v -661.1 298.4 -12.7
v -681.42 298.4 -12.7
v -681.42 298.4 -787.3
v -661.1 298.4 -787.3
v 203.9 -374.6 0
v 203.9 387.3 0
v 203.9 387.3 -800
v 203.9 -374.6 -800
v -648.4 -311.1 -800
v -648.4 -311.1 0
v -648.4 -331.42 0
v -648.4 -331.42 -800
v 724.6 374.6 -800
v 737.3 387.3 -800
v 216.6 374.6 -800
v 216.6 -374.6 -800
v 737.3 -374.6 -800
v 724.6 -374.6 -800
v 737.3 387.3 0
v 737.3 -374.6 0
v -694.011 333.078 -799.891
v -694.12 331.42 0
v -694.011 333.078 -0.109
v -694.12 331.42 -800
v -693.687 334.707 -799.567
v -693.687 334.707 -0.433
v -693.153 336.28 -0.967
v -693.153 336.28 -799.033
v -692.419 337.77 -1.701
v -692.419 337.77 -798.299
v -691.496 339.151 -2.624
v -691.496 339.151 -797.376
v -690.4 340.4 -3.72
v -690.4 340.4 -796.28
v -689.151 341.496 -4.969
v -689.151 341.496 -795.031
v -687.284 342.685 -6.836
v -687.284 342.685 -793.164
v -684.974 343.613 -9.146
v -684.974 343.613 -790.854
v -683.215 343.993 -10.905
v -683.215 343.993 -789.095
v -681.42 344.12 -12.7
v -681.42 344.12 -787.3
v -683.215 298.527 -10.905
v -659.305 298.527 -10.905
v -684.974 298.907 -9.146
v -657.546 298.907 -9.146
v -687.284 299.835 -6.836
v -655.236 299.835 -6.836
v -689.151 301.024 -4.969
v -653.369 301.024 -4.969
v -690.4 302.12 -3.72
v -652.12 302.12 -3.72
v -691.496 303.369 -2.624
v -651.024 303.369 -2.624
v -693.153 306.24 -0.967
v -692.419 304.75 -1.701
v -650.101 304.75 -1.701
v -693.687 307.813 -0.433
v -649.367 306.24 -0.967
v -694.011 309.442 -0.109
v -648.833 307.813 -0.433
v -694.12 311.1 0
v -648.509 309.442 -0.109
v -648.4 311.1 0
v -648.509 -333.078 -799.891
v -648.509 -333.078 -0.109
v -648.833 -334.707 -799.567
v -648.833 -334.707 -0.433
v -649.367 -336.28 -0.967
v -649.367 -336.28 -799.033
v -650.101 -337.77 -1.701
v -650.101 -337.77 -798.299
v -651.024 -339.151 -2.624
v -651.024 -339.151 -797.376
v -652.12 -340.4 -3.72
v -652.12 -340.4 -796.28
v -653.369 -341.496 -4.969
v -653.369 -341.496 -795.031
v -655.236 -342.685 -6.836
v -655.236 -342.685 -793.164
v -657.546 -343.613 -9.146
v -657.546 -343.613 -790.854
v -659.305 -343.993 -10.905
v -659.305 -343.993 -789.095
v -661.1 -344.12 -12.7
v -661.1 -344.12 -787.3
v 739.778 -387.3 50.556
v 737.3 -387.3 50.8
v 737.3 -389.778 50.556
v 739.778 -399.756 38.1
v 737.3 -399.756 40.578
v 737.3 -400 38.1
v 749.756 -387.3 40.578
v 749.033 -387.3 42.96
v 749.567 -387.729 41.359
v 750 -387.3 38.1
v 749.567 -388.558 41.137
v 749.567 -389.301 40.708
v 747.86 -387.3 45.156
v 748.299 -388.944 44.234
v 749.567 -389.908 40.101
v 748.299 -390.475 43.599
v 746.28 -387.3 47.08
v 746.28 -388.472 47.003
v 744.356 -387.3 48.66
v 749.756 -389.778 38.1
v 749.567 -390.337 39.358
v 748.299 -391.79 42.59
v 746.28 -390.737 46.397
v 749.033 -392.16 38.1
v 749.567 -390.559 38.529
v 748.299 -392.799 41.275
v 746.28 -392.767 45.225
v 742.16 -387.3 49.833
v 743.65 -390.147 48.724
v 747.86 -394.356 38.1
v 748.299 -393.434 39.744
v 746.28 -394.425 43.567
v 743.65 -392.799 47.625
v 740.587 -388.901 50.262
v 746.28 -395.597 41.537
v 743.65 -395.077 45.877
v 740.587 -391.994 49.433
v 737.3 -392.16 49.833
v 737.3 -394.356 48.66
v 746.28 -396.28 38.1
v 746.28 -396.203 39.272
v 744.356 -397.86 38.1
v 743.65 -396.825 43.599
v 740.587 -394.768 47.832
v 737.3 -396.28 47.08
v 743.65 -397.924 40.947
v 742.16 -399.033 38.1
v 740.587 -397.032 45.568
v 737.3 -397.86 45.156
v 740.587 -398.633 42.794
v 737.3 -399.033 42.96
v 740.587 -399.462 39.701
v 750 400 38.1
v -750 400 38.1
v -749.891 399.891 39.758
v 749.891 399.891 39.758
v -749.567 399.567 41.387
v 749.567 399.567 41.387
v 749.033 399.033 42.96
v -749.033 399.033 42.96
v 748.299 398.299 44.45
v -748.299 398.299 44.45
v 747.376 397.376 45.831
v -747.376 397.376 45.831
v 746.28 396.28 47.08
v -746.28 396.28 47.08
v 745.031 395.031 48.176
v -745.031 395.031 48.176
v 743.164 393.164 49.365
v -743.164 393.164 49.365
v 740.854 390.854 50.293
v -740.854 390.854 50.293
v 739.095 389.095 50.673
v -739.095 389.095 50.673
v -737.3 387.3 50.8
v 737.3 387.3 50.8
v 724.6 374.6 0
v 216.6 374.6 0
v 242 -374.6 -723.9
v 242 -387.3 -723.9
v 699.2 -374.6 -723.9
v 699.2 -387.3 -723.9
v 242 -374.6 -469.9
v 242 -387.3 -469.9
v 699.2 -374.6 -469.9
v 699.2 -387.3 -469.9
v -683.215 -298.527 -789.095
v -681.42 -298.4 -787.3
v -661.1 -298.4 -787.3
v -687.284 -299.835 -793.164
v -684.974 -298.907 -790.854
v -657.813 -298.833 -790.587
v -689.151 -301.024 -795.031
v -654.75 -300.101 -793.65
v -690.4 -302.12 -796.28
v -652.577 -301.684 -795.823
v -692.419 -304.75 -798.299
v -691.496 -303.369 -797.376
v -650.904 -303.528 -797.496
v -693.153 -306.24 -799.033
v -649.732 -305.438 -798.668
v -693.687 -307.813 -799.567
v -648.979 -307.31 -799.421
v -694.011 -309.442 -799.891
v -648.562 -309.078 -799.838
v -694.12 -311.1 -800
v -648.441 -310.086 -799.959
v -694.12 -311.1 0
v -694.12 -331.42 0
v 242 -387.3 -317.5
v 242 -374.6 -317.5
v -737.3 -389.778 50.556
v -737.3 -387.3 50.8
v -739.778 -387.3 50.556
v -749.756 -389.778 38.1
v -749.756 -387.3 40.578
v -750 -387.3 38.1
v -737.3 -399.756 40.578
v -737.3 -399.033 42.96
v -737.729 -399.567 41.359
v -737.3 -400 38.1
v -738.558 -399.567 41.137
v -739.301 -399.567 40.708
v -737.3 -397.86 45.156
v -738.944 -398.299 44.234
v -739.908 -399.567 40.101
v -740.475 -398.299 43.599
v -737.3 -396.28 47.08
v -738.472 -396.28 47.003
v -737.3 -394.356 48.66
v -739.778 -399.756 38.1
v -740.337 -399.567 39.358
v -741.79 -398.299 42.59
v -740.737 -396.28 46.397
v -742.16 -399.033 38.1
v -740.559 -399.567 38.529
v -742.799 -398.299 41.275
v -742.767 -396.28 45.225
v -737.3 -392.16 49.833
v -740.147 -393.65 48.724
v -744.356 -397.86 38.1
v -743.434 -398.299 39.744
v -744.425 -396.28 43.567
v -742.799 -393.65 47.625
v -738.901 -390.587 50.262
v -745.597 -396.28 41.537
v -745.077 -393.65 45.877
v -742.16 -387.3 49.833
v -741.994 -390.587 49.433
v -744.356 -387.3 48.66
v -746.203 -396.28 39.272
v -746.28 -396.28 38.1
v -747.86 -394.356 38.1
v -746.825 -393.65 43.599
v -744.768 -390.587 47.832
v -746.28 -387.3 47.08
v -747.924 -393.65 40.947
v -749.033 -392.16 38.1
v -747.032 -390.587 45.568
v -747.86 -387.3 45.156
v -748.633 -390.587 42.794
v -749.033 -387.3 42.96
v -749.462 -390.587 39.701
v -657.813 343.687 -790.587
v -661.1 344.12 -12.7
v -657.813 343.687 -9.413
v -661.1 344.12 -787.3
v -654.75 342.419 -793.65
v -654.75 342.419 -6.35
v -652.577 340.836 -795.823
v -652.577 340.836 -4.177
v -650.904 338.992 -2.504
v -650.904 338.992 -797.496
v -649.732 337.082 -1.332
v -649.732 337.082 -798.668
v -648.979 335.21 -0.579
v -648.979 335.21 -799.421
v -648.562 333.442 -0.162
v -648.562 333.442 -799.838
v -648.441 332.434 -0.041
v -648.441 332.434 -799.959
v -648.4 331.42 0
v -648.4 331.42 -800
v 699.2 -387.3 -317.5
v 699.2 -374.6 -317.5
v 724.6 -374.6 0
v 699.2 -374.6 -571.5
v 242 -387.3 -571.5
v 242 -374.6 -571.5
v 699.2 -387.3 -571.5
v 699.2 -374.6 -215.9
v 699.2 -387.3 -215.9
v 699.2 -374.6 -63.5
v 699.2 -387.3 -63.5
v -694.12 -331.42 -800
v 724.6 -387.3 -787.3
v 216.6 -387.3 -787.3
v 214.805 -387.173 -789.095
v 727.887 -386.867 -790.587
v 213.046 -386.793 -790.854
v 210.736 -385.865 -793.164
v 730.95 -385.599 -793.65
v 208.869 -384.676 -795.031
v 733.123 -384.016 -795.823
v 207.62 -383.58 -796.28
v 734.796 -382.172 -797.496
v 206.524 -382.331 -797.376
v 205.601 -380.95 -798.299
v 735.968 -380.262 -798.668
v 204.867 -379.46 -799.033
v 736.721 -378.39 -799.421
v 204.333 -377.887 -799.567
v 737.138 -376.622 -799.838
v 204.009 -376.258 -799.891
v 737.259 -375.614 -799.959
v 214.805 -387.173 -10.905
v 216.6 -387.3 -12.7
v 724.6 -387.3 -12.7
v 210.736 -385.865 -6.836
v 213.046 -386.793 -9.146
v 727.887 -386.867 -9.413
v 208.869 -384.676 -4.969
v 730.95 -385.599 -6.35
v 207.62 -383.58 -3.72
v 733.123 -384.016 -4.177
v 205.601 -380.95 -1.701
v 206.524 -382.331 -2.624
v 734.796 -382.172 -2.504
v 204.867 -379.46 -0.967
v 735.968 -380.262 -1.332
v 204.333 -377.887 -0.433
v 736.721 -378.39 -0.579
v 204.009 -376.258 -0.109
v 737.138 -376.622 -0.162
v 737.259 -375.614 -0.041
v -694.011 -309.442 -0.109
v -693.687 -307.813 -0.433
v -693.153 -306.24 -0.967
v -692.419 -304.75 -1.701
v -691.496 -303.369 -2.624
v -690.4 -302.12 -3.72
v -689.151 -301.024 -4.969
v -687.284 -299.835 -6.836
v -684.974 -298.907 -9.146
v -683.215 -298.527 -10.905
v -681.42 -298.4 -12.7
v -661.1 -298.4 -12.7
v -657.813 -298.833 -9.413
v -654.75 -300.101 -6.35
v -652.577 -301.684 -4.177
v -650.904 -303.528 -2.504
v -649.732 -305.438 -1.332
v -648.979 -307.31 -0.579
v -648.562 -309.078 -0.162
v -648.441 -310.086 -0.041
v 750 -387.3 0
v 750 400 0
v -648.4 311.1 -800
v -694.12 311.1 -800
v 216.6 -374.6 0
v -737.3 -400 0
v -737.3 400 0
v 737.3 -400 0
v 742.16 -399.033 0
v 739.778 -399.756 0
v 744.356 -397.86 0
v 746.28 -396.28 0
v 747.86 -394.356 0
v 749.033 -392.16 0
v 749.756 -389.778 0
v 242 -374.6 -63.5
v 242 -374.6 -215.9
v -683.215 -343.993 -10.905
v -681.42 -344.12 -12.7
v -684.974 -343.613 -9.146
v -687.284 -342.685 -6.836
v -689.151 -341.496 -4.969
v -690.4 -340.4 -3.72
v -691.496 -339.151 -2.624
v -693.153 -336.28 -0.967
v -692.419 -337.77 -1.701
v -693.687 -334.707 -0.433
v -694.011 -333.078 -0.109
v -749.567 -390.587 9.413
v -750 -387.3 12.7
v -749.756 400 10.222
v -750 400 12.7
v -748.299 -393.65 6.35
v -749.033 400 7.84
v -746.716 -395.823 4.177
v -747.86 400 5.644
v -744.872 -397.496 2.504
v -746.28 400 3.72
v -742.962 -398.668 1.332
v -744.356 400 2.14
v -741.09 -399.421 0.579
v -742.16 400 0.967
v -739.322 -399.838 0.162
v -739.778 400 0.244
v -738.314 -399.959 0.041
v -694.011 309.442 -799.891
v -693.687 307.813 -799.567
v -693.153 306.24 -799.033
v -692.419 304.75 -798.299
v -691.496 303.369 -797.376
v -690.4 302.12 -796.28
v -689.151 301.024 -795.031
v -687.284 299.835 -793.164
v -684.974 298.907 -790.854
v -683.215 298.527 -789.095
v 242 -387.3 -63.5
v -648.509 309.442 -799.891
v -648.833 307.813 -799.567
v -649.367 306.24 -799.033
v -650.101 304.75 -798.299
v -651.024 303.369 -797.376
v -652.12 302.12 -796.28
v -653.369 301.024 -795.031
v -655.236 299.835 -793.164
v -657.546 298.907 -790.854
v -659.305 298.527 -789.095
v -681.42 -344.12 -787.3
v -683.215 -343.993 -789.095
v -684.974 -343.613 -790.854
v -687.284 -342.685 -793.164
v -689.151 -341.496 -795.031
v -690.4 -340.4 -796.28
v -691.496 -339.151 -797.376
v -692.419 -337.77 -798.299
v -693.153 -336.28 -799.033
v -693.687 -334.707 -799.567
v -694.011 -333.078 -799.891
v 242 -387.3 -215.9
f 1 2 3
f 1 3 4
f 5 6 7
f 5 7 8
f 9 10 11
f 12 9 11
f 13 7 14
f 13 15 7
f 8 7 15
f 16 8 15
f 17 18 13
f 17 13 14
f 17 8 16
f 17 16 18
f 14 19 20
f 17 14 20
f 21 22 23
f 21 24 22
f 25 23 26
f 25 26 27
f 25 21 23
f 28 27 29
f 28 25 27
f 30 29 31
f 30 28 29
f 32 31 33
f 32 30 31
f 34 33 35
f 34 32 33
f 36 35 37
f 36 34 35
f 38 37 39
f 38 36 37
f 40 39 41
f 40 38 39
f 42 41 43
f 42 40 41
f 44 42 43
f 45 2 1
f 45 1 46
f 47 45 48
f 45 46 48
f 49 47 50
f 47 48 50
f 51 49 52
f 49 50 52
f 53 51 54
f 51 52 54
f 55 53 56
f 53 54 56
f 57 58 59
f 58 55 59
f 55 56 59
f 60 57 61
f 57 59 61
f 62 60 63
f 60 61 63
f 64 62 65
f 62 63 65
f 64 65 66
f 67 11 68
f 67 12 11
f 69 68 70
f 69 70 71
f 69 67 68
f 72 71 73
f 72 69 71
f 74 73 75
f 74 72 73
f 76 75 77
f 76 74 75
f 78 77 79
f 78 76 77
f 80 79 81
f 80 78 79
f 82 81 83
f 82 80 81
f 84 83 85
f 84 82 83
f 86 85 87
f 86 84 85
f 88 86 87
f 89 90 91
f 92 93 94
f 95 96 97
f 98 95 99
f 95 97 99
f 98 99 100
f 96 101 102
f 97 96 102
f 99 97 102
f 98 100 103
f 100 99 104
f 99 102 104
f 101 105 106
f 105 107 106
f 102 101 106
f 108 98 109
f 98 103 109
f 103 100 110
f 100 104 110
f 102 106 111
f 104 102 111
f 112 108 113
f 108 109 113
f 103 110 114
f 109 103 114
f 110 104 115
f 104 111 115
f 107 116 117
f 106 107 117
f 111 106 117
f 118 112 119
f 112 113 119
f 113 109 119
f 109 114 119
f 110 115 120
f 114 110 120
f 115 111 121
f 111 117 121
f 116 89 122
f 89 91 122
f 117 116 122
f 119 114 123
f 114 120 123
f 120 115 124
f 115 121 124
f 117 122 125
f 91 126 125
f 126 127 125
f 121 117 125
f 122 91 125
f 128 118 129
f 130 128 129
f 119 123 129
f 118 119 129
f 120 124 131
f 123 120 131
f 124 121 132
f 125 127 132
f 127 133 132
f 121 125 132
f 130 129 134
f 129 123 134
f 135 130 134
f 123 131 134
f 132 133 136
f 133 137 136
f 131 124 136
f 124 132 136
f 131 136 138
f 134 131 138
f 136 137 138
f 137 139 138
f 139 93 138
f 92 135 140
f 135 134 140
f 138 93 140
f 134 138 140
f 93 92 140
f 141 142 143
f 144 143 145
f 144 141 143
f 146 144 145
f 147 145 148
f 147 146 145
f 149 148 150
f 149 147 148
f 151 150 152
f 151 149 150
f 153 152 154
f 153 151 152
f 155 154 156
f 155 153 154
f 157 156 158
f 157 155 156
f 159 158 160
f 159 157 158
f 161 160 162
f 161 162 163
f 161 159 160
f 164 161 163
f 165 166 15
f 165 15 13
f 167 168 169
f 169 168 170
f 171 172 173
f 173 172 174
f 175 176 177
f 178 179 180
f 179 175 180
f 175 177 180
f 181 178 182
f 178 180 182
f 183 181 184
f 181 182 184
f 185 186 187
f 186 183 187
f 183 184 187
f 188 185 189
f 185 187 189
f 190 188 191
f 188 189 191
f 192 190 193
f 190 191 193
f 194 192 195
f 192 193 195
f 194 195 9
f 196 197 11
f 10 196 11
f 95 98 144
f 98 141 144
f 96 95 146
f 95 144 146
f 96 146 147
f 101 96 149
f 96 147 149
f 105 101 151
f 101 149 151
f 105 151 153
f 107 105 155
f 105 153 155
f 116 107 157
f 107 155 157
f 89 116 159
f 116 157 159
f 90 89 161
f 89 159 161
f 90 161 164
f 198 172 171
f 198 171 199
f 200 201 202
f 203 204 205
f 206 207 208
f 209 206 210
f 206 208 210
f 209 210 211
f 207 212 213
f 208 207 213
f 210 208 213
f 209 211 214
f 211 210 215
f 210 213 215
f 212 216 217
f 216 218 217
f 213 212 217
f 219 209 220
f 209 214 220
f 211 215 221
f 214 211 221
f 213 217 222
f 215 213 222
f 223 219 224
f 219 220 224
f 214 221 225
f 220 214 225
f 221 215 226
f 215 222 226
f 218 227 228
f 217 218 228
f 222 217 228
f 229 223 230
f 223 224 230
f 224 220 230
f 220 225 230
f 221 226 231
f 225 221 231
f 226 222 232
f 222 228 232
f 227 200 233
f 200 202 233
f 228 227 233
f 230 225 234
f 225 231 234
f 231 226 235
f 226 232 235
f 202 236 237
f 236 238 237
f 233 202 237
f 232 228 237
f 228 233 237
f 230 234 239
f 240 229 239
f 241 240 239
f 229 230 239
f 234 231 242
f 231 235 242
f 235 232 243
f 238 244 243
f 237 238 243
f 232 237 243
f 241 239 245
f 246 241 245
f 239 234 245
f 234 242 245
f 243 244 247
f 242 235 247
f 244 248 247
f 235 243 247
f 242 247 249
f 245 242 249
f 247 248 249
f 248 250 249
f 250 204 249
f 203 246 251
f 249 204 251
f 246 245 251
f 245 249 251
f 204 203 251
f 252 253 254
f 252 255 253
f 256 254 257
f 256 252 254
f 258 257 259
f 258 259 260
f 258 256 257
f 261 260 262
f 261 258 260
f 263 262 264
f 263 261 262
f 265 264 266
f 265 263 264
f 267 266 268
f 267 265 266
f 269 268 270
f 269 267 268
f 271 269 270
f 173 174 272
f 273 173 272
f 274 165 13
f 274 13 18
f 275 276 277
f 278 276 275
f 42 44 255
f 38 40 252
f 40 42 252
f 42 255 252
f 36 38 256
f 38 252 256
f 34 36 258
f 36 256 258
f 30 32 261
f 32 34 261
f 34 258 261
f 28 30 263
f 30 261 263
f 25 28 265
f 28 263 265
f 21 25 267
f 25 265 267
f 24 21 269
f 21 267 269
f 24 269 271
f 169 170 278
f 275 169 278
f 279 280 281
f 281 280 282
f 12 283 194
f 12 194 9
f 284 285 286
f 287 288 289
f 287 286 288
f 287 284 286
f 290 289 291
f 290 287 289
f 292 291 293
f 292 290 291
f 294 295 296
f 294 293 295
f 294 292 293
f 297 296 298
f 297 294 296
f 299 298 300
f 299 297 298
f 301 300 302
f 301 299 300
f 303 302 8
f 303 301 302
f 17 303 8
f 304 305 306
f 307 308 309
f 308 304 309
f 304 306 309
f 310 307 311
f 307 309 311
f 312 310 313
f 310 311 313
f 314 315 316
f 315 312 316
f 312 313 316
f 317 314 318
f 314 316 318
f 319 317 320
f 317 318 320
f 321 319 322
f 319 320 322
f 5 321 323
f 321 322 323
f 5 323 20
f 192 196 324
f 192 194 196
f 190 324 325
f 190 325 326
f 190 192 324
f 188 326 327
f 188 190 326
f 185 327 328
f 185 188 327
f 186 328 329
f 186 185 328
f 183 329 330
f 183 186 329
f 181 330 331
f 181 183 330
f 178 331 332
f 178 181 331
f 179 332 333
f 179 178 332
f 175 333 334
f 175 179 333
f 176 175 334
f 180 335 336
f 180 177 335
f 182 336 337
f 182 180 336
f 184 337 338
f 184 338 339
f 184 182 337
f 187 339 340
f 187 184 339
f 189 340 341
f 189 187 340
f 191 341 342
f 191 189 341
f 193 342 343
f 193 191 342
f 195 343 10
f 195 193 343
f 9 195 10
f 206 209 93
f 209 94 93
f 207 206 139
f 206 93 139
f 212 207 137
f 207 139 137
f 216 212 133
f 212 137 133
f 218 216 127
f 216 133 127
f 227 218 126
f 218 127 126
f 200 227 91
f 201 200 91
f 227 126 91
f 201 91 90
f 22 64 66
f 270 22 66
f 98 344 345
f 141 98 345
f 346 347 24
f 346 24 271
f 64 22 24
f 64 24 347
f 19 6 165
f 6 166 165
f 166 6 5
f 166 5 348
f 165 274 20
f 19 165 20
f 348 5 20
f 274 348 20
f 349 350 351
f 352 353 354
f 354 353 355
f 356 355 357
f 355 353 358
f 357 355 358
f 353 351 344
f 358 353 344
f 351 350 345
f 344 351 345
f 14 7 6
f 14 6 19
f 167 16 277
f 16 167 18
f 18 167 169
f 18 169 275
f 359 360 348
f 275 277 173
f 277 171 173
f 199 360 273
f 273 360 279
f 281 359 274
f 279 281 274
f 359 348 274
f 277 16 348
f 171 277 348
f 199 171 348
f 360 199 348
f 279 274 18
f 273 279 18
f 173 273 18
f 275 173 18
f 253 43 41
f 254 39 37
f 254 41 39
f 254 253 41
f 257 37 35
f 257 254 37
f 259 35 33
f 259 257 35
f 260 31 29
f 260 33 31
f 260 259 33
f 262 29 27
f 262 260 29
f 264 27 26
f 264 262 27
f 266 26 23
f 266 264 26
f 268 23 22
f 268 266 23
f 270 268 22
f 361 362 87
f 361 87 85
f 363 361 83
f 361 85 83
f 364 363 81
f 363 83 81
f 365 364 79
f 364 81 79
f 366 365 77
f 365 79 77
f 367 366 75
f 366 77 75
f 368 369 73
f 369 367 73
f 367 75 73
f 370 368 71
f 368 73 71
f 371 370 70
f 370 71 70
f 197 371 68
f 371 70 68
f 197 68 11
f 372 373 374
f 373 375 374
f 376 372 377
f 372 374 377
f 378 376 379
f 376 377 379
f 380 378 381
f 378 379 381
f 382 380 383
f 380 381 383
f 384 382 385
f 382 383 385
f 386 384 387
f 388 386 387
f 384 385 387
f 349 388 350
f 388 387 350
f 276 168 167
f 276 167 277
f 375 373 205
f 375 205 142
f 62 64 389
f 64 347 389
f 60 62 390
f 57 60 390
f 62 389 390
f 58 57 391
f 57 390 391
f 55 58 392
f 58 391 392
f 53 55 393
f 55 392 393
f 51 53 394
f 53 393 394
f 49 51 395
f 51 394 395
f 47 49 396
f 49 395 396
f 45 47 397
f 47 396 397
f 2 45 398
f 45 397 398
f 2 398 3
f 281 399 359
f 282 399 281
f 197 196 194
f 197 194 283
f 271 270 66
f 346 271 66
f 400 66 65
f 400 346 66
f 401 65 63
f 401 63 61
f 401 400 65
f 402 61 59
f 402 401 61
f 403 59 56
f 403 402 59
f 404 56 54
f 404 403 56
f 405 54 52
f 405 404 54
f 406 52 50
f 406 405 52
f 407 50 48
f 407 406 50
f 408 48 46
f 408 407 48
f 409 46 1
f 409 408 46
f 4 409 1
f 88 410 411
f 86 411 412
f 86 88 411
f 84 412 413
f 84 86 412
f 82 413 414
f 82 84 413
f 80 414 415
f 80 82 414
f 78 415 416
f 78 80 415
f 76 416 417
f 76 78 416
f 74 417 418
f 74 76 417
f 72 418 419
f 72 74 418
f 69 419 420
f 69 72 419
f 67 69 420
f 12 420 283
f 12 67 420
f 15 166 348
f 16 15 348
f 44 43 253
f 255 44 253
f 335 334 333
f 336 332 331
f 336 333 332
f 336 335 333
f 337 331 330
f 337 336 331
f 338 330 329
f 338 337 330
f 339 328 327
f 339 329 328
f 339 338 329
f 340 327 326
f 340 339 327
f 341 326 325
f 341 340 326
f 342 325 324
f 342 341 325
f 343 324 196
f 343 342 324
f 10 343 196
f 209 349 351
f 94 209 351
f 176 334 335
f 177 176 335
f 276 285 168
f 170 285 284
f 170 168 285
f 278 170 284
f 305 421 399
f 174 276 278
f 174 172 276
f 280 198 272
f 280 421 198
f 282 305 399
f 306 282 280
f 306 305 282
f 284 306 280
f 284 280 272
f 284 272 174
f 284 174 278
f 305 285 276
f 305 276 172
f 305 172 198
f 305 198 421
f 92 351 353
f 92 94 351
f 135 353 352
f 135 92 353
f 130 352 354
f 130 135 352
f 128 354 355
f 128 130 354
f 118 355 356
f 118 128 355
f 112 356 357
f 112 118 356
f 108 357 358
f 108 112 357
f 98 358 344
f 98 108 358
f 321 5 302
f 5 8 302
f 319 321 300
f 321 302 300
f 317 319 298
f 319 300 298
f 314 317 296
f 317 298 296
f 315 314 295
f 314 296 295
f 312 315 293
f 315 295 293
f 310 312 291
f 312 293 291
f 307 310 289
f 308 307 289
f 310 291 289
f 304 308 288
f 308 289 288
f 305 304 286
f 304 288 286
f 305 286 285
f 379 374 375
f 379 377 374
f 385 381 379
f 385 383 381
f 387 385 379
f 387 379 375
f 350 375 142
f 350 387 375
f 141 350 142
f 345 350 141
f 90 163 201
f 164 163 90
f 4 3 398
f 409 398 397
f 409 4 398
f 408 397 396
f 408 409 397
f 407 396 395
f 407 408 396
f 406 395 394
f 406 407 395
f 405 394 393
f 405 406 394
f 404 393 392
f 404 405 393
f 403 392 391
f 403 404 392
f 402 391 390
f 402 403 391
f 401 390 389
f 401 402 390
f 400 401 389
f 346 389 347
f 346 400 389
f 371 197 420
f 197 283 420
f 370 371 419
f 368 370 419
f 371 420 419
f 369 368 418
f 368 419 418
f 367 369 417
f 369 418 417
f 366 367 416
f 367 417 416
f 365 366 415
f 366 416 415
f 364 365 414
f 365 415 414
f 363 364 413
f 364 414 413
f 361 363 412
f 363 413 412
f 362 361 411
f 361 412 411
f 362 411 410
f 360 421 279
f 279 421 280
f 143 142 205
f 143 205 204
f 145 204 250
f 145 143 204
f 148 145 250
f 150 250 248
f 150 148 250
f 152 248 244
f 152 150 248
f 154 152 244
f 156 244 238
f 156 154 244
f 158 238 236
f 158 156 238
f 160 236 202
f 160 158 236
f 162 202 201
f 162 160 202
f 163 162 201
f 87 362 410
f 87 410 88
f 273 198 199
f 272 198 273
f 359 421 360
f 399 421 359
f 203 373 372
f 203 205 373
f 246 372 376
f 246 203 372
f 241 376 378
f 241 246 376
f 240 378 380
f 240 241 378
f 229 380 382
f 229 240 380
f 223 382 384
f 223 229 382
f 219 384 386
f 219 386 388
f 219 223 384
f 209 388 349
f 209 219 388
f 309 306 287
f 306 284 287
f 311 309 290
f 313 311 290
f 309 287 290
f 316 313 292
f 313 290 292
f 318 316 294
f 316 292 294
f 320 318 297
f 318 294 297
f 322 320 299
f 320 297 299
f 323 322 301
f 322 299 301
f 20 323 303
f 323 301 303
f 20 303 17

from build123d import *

# Parameters (mm, degrees)
F0_W     = 1500
F0_H     = 800
F1_DEPTH = 50.8
F2_W     = 45.72
F2_H     = 45.72
F3_DEPTH = 800
F4_W     = 533.4
F4_H     = 774.6
F4_W_2   = 508
F4_H_2   = 749.2
F5_DEPTH = 800
F6_R     = 12.69999
F6_2_R   = 12.69999
F6_3_R   = 12.69999
F6_4_R   = 12.69999
F7_W     = 457.2
F7_H     = 152.4
F8_DEPTH = 25.4


# Not quite as in the source:
# - a fillet or chamfer is up to 0.001 mm smaller than in the source, because OpenCascade refuses the exact size


with BuildPart() as f1:
    # F0 (on Top) → F1 (new body)
    with BuildSketch(Plane.XY):
        Rectangle(F0_W, F0_H)
    extrude(amount=F1_DEPTH)

    # F6#2 (radius 12.7 in the source; OpenCascade refuses exactly that, so slightly less here)
    f6_2_edges = [f1.edges().sort_by_distance(p)[0] for p in [
        (0, 400, 50.8),
        (-750, 0, 50.8),
        (0, -400, 50.8),
        (750, 0, 50.8),
        (-750, 0, 0),
        (-750, -400, 25.4),
        (750, -400, 25.4),
    ]]
    fillet(f6_2_edges, radius=F6_2_R)


with BuildPart() as f3:
    # F2 (on face) → F3 (new body)
    with BuildSketch(Plane(origin=(0, 0, 0), x_dir=(1, 0, 0), z_dir=(0, 0, -1))):
        with Locations((-671.26, 321.26)):
            Rectangle(F2_W, F2_H)
    extrude(amount=F3_DEPTH)

    # F6#3 (radius 12.7 in the source; OpenCascade refuses exactly that, so slightly less here)
    f6_3_edges = [f3.edges().sort_by_distance(p)[0] for p in [
        (-648.4, -344.12, -400),
        (-694.12, -344.12, -400),
        (-671.26, -344.12, 0),
        (-671.26, -344.12, -800),
        (-694.12, -298.4, -400),
        (-648.4, -298.4, -400),
        (-671.26, -298.4, 0),
        (-671.26, -298.4, -800),
    ]]
    fillet(f6_3_edges, radius=F6_3_R)


with BuildPart() as f3b:
    # F2 (on face) → F3, piece 2 (new body)
    with BuildSketch(Plane(origin=(0, 0, 0), x_dir=(1, 0, 0), z_dir=(0, 0, -1))):
        with Locations((-671.26, -321.26)):
            Rectangle(F2_W, F2_H)
    extrude(amount=F3_DEPTH)

    # F6#4 (radius 12.7 in the source; OpenCascade refuses exactly that, so slightly less here)
    f6_4_edges = [f3b.edges().sort_by_distance(p)[0] for p in [
        (-648.4, 298.4, -400),
        (-694.12, 298.4, -400),
        (-671.26, 298.4, 0),
        (-671.26, 298.4, -800),
        (-694.12, 344.12, -400),
        (-648.4, 344.12, -400),
        (-671.26, 344.12, 0),
        (-671.26, 344.12, -800),
    ]]
    fillet(f6_4_edges, radius=F6_4_R)


with BuildPart() as f5:
    # F4 (on face) → F5 (new body)
    with BuildSketch(Plane(origin=(0, 0, 0), x_dir=(1, 0, 0), z_dir=(0, 0, -1))):
        with Locations((470.6, 0)):
            Rectangle(F4_W, F4_H)
        with Locations((470.6, 0)):
            Rectangle(F4_W_2, F4_H_2, mode=Mode.SUBTRACT)
    extrude(amount=F5_DEPTH)

    # F6 (radius 12.7 in the source; OpenCascade refuses exactly that, so slightly less here)
    f6_edges = [f5.edges().sort_by_distance(p)[0] for p in [
        (737.3, -387.3, -400),
        (203.9, -387.3, -400),
        (470.6, -387.3, 0),
        (470.6, -387.3, -800),
    ]]
    fillet(f6_edges, radius=F6_R)

    # F7 (on face) → F8 (cut)
    with BuildSketch(Plane.XZ.offset(387.3)):
        with Locations((470.6, -139.7)):
            Rectangle(F7_W, F7_H)
        with Locations((470.6, -393.7)):
            Rectangle(F7_W, F7_H)
        with Locations((470.6, -647.7)):
            Rectangle(F7_W, F7_H)
    extrude(amount=-F8_DEPTH, mode=Mode.SUBTRACT)


solid = Compound([f1.part, f3.part, f3b.part, f5.part])
